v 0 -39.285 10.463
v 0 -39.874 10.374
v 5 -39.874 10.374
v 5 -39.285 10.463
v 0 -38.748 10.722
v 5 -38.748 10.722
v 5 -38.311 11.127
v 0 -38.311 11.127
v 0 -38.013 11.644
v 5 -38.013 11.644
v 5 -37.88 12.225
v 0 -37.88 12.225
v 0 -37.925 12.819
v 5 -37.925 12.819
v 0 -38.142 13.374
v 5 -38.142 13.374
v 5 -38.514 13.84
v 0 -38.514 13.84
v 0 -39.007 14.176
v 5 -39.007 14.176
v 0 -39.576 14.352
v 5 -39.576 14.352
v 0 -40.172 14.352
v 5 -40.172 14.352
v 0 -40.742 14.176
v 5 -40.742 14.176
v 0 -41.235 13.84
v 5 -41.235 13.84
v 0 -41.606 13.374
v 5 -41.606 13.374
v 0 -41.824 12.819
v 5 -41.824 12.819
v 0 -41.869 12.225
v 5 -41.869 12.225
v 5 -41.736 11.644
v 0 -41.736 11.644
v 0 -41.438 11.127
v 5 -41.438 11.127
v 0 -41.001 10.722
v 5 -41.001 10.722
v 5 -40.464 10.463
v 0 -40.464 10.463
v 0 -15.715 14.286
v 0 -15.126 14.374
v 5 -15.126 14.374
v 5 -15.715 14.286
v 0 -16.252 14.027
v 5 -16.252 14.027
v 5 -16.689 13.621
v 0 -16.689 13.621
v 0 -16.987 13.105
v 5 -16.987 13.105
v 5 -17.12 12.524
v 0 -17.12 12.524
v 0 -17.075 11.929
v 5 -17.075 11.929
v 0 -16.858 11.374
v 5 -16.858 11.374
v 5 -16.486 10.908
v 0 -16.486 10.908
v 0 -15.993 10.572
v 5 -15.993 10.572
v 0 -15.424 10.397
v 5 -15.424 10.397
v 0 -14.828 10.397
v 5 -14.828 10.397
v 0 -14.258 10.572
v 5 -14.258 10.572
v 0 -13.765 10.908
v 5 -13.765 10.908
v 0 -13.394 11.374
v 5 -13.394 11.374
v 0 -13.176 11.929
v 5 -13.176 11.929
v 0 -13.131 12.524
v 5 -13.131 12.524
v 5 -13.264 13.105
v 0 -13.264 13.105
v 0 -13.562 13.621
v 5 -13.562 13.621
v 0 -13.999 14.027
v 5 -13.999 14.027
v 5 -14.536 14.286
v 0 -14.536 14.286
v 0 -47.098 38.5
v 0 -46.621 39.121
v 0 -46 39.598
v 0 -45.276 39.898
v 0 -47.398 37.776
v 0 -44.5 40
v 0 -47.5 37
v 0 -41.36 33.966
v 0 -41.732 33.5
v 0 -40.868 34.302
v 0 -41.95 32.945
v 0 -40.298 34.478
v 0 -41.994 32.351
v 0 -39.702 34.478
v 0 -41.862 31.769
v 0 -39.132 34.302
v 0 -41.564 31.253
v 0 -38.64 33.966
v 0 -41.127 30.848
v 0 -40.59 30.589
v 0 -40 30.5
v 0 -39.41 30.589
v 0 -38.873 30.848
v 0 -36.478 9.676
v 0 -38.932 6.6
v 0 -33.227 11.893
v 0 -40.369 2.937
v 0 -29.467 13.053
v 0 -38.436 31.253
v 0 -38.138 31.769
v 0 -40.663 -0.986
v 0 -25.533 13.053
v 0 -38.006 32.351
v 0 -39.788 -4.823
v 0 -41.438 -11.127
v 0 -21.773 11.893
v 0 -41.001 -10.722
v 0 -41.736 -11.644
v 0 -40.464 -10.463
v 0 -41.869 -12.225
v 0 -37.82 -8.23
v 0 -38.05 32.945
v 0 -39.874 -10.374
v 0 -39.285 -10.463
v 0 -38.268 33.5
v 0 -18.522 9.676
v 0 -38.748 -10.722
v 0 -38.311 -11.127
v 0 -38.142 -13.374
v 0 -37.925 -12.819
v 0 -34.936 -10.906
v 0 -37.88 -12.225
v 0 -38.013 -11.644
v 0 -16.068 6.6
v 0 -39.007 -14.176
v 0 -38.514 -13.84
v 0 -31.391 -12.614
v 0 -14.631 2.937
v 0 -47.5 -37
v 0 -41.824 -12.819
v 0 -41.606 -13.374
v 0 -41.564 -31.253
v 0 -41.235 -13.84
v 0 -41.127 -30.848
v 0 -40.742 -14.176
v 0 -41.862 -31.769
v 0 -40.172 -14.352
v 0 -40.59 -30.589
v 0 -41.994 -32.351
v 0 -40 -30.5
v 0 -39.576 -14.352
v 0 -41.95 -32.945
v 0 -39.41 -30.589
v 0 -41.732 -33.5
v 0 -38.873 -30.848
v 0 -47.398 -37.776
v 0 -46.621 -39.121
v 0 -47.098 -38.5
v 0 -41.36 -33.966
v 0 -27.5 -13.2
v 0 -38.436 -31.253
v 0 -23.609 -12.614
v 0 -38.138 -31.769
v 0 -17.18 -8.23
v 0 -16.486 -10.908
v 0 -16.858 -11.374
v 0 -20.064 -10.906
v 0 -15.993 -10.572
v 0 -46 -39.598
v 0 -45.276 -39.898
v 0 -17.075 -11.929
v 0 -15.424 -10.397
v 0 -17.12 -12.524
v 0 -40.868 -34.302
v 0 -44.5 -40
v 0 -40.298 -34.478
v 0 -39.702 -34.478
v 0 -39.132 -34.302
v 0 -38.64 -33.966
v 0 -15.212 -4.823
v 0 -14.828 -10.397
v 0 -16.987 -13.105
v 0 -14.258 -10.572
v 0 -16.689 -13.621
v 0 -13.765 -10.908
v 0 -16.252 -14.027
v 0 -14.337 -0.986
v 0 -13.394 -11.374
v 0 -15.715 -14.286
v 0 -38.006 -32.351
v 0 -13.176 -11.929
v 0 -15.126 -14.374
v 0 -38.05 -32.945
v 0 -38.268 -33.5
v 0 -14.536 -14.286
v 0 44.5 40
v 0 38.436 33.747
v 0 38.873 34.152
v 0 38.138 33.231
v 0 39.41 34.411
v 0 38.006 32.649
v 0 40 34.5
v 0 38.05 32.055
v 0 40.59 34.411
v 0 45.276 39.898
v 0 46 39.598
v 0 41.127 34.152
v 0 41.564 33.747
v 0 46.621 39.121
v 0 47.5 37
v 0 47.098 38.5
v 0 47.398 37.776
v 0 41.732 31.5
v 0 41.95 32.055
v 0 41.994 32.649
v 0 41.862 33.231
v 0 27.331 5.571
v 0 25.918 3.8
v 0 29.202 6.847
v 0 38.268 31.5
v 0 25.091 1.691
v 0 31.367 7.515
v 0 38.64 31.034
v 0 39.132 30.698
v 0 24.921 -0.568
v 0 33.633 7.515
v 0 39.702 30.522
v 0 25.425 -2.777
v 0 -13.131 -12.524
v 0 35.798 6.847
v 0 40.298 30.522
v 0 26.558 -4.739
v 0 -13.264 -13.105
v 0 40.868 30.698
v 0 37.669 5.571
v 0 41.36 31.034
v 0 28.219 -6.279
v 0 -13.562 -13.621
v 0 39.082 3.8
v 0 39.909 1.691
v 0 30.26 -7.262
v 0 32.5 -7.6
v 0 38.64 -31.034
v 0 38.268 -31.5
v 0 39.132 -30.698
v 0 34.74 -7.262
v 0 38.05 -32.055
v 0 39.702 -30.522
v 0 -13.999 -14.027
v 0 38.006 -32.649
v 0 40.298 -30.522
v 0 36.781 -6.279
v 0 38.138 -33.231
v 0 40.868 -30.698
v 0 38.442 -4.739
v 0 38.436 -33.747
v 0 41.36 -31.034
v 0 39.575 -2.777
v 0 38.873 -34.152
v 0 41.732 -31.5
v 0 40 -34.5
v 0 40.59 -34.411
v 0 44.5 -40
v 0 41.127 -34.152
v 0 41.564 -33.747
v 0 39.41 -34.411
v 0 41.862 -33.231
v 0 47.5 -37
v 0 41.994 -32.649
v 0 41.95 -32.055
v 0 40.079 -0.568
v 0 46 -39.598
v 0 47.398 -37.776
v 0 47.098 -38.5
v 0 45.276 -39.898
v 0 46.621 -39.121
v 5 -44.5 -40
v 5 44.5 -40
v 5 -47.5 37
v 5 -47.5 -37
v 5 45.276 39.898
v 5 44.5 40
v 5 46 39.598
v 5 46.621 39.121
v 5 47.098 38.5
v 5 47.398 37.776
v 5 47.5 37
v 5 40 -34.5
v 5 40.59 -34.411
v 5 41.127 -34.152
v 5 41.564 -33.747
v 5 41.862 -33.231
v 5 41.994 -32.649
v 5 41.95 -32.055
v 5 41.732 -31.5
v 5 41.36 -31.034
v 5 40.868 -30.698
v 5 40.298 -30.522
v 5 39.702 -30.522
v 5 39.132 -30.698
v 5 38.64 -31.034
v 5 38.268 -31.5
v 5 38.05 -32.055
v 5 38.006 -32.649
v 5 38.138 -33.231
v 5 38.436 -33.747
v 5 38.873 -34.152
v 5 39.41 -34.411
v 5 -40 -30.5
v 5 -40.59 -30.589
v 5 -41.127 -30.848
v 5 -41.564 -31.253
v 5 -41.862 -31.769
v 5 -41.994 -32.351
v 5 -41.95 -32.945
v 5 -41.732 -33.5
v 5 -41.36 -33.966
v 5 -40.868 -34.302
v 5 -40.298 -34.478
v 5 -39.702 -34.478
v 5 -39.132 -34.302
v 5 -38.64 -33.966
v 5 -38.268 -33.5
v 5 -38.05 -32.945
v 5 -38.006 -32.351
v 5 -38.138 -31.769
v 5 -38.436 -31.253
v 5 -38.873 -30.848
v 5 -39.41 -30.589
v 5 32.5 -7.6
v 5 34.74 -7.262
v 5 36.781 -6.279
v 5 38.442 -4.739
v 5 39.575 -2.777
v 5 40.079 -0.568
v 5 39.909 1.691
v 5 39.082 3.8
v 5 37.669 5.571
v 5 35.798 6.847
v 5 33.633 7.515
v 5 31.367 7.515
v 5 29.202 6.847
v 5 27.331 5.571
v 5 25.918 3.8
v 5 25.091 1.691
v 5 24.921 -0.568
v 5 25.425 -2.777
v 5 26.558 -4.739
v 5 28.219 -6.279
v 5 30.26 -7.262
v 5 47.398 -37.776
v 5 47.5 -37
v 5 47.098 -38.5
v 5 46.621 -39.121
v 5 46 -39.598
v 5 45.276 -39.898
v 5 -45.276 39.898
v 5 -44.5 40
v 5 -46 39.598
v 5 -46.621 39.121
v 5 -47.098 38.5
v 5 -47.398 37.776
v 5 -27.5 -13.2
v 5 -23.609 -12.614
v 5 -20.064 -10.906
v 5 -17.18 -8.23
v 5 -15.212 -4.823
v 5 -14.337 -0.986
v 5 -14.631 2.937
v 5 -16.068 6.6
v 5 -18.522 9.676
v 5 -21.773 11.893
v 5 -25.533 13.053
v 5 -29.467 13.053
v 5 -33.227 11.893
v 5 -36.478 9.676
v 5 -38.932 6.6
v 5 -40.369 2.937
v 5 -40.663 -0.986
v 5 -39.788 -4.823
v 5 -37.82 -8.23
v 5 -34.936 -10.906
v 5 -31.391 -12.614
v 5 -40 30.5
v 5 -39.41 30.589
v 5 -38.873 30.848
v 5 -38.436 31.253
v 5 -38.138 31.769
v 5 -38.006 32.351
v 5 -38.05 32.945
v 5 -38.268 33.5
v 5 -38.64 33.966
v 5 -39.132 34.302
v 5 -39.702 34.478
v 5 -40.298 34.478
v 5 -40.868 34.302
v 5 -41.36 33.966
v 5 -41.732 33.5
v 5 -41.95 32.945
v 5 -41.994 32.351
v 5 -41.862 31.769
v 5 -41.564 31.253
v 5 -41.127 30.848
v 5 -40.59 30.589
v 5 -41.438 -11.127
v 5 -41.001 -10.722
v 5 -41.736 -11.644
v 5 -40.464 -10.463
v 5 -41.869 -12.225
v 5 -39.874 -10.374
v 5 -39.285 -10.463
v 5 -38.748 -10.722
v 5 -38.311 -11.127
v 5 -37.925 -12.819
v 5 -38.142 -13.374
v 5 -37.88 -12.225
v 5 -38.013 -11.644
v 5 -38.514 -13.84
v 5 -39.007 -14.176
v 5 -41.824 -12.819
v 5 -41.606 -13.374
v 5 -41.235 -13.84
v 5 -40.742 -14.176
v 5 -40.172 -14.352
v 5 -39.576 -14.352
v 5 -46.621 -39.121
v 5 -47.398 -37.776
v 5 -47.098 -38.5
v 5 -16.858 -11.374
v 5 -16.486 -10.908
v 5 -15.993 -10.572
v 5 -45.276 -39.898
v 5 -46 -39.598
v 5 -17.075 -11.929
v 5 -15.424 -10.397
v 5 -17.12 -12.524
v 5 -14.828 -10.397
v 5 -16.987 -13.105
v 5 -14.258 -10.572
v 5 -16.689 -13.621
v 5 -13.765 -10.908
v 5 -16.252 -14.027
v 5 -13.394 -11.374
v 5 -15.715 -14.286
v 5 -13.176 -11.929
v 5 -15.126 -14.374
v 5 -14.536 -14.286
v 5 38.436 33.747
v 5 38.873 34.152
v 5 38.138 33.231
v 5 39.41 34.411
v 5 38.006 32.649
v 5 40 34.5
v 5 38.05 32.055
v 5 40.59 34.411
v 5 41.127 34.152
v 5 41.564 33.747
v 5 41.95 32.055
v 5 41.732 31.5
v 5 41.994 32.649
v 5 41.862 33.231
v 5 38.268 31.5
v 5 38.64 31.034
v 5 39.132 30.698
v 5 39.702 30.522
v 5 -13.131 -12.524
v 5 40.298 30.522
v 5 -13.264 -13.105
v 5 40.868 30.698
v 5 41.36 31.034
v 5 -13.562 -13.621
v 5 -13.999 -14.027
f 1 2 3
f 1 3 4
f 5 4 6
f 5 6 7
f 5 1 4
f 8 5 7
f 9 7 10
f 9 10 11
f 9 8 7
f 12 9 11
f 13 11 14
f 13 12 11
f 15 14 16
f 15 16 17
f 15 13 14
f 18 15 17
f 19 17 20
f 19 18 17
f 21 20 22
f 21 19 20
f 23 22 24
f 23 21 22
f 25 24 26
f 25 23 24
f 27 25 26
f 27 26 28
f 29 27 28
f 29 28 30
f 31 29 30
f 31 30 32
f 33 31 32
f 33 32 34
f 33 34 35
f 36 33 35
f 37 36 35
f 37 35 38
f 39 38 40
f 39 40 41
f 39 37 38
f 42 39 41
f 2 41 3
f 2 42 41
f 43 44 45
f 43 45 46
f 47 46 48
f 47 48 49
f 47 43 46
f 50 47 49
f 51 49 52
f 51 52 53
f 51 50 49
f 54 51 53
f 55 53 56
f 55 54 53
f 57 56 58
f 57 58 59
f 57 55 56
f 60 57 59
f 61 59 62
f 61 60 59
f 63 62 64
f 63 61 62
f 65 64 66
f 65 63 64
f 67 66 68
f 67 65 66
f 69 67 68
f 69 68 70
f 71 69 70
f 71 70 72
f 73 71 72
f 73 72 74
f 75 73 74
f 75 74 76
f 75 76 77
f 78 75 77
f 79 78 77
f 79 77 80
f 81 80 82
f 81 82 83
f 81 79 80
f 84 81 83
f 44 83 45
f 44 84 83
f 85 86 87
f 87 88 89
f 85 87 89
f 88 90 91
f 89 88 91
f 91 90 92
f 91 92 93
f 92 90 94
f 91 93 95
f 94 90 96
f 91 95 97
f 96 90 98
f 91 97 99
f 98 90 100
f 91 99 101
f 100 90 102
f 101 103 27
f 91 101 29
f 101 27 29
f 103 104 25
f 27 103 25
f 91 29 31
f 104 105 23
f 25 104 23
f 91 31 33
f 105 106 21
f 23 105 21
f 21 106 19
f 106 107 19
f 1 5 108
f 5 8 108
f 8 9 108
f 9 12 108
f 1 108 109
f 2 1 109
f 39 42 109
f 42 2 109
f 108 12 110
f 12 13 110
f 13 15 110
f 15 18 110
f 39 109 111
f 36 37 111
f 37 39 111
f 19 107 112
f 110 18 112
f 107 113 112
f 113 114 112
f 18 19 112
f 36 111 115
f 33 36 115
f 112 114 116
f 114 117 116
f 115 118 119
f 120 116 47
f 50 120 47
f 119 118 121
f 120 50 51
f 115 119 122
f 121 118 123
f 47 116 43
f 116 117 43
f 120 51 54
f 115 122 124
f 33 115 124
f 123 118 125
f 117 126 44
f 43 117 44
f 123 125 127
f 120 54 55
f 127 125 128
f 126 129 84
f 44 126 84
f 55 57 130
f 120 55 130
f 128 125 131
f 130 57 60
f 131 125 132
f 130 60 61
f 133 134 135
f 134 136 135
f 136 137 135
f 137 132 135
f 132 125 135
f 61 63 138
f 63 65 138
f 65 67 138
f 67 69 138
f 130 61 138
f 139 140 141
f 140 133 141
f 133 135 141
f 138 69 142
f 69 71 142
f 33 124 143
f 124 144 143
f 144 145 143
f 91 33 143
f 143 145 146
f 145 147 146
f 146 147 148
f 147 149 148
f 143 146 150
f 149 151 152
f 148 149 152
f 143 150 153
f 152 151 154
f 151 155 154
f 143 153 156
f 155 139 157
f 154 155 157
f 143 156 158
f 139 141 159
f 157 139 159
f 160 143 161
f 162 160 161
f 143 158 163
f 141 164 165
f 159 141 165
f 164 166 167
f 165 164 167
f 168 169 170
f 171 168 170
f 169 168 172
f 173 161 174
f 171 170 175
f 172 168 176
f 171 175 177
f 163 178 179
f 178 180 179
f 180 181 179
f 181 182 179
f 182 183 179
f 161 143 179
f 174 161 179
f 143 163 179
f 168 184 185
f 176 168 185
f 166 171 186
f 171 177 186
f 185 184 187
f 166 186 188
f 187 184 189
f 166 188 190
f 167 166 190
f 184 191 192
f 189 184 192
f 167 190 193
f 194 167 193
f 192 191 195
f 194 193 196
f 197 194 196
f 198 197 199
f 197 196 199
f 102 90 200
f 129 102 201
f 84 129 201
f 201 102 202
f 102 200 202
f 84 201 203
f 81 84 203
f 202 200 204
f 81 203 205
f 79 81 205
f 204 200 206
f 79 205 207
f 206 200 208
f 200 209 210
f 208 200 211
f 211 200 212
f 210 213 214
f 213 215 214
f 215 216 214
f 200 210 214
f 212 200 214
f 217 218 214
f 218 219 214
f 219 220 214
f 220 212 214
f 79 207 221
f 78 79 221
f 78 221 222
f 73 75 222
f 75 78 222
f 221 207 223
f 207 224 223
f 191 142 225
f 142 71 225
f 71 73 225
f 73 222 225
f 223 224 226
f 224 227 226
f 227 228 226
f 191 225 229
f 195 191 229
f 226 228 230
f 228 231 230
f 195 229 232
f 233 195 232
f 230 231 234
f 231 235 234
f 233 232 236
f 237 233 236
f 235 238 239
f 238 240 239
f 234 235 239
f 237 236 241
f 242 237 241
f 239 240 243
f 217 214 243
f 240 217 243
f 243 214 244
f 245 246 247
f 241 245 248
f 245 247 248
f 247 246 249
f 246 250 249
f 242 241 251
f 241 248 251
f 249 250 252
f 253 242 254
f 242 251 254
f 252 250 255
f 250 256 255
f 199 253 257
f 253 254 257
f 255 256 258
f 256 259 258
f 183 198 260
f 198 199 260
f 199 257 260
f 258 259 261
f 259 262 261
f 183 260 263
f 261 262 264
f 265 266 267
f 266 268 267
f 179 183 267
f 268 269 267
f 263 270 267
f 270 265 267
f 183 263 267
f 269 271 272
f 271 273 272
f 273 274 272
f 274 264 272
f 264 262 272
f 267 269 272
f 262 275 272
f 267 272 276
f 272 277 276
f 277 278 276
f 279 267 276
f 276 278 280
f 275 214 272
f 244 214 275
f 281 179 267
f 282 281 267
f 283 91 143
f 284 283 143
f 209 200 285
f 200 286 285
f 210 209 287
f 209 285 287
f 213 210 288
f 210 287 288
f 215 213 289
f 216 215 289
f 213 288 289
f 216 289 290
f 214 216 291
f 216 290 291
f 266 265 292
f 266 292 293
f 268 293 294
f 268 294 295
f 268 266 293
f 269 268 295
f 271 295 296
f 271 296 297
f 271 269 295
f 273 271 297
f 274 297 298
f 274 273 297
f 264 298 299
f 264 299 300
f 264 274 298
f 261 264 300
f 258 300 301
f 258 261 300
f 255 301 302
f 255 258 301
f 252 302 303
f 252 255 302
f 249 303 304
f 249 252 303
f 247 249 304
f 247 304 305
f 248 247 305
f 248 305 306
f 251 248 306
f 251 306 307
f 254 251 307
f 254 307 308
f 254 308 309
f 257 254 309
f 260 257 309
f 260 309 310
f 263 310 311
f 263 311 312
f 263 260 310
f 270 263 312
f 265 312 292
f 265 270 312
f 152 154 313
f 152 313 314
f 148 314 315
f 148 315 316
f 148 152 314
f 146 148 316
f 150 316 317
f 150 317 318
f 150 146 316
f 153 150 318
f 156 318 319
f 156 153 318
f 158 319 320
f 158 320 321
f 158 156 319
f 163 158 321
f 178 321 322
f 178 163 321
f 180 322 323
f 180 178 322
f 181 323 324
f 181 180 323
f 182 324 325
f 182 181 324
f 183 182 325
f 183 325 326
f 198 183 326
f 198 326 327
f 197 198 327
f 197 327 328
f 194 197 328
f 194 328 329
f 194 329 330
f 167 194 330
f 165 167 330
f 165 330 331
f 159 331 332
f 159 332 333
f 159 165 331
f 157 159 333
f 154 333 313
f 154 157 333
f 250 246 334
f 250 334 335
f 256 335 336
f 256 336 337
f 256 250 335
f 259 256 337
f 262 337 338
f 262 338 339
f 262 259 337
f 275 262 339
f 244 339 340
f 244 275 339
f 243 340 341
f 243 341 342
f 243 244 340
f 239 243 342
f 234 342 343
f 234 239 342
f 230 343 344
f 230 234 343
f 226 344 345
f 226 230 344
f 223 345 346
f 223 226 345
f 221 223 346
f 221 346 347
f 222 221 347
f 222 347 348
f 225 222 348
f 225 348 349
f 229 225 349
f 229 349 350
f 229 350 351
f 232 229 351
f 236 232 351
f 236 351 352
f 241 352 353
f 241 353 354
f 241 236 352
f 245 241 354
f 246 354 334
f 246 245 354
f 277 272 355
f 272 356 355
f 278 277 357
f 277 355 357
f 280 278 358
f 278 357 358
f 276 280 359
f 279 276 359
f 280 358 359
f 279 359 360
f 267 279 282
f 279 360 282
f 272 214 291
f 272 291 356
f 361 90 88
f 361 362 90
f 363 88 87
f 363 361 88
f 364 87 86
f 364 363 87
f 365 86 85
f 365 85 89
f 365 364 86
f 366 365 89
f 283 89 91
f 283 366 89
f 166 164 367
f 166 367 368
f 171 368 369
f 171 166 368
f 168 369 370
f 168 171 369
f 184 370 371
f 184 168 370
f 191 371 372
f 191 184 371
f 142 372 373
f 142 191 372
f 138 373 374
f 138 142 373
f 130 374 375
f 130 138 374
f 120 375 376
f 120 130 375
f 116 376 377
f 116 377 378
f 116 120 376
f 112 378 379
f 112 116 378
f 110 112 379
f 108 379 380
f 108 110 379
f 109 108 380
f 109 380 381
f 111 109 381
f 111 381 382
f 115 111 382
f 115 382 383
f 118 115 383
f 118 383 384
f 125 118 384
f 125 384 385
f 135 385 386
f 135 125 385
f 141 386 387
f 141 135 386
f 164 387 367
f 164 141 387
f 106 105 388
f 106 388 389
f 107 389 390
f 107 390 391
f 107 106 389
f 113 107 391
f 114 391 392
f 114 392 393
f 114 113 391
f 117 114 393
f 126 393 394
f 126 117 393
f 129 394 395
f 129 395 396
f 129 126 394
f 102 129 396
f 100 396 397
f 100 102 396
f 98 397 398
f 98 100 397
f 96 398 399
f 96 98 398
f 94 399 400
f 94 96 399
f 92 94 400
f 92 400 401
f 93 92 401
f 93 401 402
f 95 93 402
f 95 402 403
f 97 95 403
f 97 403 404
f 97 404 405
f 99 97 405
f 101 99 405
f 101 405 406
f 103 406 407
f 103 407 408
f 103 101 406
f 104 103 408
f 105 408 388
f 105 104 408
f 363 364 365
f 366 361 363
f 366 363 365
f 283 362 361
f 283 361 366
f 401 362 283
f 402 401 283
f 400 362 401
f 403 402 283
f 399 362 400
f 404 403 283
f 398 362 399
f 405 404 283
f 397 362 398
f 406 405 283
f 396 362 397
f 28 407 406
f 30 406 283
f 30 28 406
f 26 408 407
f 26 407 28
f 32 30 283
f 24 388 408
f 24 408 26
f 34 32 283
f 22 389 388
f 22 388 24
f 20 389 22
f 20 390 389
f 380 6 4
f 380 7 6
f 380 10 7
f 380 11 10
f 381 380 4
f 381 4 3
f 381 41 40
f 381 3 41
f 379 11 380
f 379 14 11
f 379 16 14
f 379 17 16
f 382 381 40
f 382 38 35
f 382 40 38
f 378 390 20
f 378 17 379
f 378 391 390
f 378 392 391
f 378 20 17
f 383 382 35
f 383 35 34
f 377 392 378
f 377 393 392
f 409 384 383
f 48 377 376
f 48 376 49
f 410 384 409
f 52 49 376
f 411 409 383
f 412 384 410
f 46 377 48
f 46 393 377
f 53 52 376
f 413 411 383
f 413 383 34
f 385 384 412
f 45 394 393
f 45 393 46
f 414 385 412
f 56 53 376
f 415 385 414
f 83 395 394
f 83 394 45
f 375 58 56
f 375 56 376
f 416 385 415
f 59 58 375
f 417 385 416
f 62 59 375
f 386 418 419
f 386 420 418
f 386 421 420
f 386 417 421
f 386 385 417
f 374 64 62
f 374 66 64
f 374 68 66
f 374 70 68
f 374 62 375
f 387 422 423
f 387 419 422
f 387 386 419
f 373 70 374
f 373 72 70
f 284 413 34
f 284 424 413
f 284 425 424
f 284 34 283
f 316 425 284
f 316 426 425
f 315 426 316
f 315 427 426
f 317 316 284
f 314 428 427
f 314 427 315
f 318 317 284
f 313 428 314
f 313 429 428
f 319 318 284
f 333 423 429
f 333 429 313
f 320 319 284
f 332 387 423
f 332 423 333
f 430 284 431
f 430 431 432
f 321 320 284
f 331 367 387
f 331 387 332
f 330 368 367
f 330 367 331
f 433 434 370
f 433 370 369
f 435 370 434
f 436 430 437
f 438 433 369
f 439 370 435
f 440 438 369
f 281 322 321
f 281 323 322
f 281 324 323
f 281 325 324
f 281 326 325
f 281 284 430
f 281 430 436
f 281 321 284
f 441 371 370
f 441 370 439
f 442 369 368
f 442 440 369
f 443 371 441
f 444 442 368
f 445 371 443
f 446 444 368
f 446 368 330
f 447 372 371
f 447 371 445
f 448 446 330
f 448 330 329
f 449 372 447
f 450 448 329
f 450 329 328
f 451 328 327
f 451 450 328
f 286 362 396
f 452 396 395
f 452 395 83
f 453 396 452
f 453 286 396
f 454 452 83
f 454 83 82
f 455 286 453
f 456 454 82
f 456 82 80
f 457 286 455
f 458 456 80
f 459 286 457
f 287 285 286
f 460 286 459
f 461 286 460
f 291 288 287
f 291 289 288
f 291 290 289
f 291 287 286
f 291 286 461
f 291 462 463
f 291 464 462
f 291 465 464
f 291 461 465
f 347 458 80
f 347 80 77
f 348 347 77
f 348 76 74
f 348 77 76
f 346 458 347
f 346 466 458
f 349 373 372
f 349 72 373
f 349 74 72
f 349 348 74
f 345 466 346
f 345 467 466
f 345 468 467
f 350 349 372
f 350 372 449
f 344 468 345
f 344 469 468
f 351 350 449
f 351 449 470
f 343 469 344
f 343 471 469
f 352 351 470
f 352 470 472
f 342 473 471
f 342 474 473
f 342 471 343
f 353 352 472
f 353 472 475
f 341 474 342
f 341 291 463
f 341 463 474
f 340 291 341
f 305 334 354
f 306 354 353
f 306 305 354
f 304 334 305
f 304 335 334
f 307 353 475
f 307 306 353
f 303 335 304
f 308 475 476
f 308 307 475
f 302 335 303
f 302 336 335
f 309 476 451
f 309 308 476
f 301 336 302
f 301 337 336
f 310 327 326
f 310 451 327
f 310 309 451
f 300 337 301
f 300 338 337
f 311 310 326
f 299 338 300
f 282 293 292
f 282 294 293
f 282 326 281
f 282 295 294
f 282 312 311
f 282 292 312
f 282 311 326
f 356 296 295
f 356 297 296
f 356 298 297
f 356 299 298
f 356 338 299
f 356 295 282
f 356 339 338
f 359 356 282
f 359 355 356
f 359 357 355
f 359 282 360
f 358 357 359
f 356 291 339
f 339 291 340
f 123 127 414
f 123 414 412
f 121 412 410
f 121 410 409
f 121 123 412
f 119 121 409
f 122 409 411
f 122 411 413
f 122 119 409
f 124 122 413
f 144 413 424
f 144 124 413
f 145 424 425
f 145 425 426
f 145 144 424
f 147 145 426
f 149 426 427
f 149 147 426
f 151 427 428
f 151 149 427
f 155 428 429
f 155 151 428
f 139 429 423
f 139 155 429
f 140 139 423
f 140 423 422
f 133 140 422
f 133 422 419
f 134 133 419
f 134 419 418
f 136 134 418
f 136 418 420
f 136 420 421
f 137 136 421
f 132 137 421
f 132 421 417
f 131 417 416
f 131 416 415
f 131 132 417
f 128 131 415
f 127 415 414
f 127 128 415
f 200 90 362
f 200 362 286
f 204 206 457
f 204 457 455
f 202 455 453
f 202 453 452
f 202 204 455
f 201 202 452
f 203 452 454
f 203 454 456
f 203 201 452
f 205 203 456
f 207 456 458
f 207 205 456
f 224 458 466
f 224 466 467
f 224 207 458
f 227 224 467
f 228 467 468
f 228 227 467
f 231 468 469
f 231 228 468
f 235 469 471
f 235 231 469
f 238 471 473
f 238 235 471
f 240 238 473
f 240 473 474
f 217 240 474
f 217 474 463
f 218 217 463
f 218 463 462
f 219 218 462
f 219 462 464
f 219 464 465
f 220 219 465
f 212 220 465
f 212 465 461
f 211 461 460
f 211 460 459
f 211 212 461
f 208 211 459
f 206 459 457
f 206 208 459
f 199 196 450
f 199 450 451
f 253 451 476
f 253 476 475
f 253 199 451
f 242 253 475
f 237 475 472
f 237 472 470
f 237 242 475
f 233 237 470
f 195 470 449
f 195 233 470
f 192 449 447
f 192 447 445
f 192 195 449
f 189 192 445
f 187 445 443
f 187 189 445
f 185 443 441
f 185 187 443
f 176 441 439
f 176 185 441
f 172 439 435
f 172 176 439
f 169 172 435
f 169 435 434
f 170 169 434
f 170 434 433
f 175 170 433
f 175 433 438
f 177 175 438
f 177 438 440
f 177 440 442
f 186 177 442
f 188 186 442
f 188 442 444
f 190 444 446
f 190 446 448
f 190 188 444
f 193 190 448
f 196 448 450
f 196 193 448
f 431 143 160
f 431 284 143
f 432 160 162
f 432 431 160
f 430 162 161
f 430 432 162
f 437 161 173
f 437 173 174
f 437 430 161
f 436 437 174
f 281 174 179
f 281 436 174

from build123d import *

# Parameters (mm, degrees)
SKETCH_1_W      = 80
SKETCH_1_H      = 95
SKETCH_1_R      = 7.6
SKETCH_1_R_2    = 2
SKETCH_1_R_3    = 13.2
EXTRUDE_1_DEPTH = 5
FILLET_1_R      = 3


with BuildPart() as part:
    # ｽｹｯﾁ1 → ﾎﾞｽ - 押し出し1 (new body)
    with BuildSketch(Plane(origin=(0, 0, 0), x_dir=(0, 0, -1), z_dir=(1, 0, 0))):
        Rectangle(SKETCH_1_W, SKETCH_1_H)
        with Locations((0, 32.5)):
            Circle(SKETCH_1_R, mode=Mode.SUBTRACT)
        with Locations((12.374368671, -15.125631329)):
            Circle(SKETCH_1_R_2, mode=Mode.SUBTRACT)
        with Locations(Location((12.374368671, -39.874368671, 0), (0, 0, 180))):
            Circle(SKETCH_1_R_2, mode=Mode.SUBTRACT)
        with Locations((-12.374368671, -39.874368671)):
            Circle(SKETCH_1_R_2, mode=Mode.SUBTRACT)
        with Locations(Location((-12.374368671, -15.125631329, 0), (0, 0, 180))):
            Circle(SKETCH_1_R_2, mode=Mode.SUBTRACT)
        with Locations((0, -27.5)):
            Circle(SKETCH_1_R_3, mode=Mode.SUBTRACT)
        with Locations((32.5, 40)):
            Circle(SKETCH_1_R_2, mode=Mode.SUBTRACT)
        with Locations(Location((32.5, -40, 0), (0, 0, 180))):
            Circle(SKETCH_1_R_2, mode=Mode.SUBTRACT)
        with Locations((-32.5, -40)):
            Circle(SKETCH_1_R_2, mode=Mode.SUBTRACT)
        with Locations(Location((-32.5, 40, 0), (0, 0, 180))):
            Circle(SKETCH_1_R_2, mode=Mode.SUBTRACT)
    extrude(amount=EXTRUDE_1_DEPTH)

    # ﾌｨﾚｯﾄ1
    fillet_1_edges = [part.edges().sort_by_distance(p)[0] for p in [
        (2.5, -47.5, -40),
        (2.5, -47.5, 40),
        (2.5, 47.5, 40),
        (2.5, 47.5, -40),
    ]]
    fillet(fillet_1_edges, radius=FILLET_1_R)


solid = part.part
